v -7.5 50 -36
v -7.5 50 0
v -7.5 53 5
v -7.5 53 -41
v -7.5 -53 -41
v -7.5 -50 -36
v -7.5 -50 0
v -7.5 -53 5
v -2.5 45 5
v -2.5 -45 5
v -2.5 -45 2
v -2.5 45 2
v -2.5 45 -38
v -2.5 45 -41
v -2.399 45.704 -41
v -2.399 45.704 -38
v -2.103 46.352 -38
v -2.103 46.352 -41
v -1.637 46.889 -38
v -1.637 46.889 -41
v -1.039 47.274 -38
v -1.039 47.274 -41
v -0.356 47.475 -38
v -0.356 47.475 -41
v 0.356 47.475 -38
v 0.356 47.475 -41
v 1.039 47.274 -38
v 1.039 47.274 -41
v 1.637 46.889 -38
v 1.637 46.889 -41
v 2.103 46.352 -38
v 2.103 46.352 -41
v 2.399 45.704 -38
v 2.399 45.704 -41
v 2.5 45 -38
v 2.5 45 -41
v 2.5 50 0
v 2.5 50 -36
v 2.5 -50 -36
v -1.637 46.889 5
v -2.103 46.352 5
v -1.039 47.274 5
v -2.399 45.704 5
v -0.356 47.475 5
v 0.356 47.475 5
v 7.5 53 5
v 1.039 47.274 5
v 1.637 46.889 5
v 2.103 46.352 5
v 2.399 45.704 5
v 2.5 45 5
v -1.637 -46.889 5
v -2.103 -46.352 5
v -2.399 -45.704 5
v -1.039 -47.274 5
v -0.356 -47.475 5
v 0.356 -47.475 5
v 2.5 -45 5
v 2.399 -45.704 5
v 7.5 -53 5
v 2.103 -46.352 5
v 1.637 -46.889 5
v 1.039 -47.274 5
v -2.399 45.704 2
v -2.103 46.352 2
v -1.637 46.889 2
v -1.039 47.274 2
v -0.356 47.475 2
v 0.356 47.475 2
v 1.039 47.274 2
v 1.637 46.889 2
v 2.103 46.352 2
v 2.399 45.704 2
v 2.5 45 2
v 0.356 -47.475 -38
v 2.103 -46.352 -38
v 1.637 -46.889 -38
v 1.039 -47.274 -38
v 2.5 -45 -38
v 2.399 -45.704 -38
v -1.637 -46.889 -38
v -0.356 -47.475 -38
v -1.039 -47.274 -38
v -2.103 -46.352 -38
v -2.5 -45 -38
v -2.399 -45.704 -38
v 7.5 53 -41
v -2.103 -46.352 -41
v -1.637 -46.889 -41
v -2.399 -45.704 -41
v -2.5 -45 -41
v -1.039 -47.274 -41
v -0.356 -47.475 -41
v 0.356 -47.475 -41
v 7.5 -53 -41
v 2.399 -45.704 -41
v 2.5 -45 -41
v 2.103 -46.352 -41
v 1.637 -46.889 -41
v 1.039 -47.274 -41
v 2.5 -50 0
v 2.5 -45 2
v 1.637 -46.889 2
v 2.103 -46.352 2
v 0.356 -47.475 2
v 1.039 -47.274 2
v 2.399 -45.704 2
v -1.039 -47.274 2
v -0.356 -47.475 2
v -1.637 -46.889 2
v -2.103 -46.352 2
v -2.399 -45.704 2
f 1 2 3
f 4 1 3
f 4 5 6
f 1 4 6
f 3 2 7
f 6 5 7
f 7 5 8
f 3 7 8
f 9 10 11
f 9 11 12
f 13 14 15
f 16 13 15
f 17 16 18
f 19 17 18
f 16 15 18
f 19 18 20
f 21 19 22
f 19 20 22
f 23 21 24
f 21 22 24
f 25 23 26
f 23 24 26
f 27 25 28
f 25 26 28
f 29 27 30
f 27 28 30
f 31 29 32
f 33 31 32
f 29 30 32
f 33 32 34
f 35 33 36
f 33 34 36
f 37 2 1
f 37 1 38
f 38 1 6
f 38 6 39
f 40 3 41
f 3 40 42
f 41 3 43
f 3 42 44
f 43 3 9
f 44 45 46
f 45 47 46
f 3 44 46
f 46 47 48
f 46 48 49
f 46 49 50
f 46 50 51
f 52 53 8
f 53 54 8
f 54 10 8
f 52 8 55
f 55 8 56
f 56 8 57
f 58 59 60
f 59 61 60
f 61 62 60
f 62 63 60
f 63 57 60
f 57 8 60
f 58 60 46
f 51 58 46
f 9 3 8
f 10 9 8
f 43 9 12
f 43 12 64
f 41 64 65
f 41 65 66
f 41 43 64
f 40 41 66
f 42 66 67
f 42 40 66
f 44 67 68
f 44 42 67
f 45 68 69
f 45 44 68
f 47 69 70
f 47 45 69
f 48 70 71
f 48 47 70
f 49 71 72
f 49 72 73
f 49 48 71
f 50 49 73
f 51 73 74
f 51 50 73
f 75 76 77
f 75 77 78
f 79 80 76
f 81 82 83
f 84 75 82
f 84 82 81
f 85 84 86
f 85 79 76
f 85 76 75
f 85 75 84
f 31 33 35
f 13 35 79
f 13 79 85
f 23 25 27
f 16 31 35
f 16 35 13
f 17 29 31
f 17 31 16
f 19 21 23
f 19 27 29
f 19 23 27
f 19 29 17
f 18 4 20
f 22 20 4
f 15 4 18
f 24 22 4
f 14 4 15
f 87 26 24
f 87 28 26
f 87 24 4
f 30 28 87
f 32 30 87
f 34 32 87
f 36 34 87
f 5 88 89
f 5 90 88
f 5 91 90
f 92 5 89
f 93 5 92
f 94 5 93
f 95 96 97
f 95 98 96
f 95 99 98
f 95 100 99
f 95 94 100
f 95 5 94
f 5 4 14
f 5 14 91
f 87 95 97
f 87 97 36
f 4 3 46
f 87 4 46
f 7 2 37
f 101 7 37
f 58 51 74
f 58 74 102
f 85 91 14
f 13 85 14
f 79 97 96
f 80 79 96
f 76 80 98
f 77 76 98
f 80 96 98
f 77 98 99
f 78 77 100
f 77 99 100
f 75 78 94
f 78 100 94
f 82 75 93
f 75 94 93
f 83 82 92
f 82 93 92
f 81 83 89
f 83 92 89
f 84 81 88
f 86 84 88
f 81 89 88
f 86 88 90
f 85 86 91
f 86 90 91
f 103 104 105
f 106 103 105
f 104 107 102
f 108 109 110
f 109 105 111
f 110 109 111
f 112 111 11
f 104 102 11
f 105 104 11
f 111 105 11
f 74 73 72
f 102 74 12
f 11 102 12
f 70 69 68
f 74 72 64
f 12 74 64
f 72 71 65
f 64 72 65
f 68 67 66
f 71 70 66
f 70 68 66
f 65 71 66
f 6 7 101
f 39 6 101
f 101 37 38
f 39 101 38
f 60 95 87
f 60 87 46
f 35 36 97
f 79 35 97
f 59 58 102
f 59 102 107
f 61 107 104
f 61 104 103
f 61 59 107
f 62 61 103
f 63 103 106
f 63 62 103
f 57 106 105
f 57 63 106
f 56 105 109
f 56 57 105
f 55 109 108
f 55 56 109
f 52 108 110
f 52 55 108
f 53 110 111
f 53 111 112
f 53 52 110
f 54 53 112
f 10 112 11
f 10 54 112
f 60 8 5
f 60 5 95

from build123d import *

# Parameters (mm, degrees)
SKETCH4_W           = 15
SKETCH4_H           = 100
BOSS_EXTRUDE1_DEPTH = 5
SKETCH5_W           = 36
SKETCH5_H           = 100
BOSS_EXTRUDE2_DEPTH = 5
CUT_EXTRUDE1_DEPTH  = 3
SKETCH7_W           = 15
SKETCH7_H           = 46
BOSS_EXTRUDE3_DEPTH = 3


with BuildPart() as part:
    # Sketch4 → Boss-Extrude1 (new body)
    with BuildSketch(Plane.XY):
        Rectangle(SKETCH4_W, SKETCH4_H)
    boss_extrude1 = extrude(amount=BOSS_EXTRUDE1_DEPTH)

    # Sketch5 → Boss-Extrude2 (add)
    with BuildSketch(Plane(origin=(7.5, 0, 0), x_dir=(0, 0, -1), z_dir=(1, 0, 0))):
        with Locations((18, 0)):
            Rectangle(SKETCH5_W, SKETCH5_H)
    extrude(amount=-BOSS_EXTRUDE2_DEPTH)

    # Mirror1: Boss-Extrude1 across plane
    add(boss_extrude1.mirror(Plane.XY.offset(-18)))

    # Sketch6 → Cut-Extrude1 (cut)
    with BuildSketch(Plane.XY.offset(5)):
        with BuildLine():
            Line((2.5, 45), (2.5, -45))
            ThreePointArc((2.5, -45), (0, -47.5), (-2.5, -45))
            Line((-2.5, -45), (-2.5, 45))
            ThreePointArc((-2.5, 45), (0, 47.5), (2.5, 45))
        make_face()
    cut_extrude1 = extrude(amount=-CUT_EXTRUDE1_DEPTH, mode=Mode.SUBTRACT)

    # Mirror2: Cut-Extrude1 across plane
    add(cut_extrude1.mirror(Plane.XY.offset(-18)), mode=Mode.SUBTRACT)

    # Sketch7 → Boss-Extrude3 (add)
    with BuildSketch(Plane.XZ.offset(50)):
        with Locations((0, -18)):
            Rectangle(SKETCH7_W, SKETCH7_H)
    boss_extrude3 = extrude(amount=BOSS_EXTRUDE3_DEPTH)

    # Mirror3: Boss-Extrude3 across plane
    add(boss_extrude3.mirror(Plane.ZX))


solid = part.part
